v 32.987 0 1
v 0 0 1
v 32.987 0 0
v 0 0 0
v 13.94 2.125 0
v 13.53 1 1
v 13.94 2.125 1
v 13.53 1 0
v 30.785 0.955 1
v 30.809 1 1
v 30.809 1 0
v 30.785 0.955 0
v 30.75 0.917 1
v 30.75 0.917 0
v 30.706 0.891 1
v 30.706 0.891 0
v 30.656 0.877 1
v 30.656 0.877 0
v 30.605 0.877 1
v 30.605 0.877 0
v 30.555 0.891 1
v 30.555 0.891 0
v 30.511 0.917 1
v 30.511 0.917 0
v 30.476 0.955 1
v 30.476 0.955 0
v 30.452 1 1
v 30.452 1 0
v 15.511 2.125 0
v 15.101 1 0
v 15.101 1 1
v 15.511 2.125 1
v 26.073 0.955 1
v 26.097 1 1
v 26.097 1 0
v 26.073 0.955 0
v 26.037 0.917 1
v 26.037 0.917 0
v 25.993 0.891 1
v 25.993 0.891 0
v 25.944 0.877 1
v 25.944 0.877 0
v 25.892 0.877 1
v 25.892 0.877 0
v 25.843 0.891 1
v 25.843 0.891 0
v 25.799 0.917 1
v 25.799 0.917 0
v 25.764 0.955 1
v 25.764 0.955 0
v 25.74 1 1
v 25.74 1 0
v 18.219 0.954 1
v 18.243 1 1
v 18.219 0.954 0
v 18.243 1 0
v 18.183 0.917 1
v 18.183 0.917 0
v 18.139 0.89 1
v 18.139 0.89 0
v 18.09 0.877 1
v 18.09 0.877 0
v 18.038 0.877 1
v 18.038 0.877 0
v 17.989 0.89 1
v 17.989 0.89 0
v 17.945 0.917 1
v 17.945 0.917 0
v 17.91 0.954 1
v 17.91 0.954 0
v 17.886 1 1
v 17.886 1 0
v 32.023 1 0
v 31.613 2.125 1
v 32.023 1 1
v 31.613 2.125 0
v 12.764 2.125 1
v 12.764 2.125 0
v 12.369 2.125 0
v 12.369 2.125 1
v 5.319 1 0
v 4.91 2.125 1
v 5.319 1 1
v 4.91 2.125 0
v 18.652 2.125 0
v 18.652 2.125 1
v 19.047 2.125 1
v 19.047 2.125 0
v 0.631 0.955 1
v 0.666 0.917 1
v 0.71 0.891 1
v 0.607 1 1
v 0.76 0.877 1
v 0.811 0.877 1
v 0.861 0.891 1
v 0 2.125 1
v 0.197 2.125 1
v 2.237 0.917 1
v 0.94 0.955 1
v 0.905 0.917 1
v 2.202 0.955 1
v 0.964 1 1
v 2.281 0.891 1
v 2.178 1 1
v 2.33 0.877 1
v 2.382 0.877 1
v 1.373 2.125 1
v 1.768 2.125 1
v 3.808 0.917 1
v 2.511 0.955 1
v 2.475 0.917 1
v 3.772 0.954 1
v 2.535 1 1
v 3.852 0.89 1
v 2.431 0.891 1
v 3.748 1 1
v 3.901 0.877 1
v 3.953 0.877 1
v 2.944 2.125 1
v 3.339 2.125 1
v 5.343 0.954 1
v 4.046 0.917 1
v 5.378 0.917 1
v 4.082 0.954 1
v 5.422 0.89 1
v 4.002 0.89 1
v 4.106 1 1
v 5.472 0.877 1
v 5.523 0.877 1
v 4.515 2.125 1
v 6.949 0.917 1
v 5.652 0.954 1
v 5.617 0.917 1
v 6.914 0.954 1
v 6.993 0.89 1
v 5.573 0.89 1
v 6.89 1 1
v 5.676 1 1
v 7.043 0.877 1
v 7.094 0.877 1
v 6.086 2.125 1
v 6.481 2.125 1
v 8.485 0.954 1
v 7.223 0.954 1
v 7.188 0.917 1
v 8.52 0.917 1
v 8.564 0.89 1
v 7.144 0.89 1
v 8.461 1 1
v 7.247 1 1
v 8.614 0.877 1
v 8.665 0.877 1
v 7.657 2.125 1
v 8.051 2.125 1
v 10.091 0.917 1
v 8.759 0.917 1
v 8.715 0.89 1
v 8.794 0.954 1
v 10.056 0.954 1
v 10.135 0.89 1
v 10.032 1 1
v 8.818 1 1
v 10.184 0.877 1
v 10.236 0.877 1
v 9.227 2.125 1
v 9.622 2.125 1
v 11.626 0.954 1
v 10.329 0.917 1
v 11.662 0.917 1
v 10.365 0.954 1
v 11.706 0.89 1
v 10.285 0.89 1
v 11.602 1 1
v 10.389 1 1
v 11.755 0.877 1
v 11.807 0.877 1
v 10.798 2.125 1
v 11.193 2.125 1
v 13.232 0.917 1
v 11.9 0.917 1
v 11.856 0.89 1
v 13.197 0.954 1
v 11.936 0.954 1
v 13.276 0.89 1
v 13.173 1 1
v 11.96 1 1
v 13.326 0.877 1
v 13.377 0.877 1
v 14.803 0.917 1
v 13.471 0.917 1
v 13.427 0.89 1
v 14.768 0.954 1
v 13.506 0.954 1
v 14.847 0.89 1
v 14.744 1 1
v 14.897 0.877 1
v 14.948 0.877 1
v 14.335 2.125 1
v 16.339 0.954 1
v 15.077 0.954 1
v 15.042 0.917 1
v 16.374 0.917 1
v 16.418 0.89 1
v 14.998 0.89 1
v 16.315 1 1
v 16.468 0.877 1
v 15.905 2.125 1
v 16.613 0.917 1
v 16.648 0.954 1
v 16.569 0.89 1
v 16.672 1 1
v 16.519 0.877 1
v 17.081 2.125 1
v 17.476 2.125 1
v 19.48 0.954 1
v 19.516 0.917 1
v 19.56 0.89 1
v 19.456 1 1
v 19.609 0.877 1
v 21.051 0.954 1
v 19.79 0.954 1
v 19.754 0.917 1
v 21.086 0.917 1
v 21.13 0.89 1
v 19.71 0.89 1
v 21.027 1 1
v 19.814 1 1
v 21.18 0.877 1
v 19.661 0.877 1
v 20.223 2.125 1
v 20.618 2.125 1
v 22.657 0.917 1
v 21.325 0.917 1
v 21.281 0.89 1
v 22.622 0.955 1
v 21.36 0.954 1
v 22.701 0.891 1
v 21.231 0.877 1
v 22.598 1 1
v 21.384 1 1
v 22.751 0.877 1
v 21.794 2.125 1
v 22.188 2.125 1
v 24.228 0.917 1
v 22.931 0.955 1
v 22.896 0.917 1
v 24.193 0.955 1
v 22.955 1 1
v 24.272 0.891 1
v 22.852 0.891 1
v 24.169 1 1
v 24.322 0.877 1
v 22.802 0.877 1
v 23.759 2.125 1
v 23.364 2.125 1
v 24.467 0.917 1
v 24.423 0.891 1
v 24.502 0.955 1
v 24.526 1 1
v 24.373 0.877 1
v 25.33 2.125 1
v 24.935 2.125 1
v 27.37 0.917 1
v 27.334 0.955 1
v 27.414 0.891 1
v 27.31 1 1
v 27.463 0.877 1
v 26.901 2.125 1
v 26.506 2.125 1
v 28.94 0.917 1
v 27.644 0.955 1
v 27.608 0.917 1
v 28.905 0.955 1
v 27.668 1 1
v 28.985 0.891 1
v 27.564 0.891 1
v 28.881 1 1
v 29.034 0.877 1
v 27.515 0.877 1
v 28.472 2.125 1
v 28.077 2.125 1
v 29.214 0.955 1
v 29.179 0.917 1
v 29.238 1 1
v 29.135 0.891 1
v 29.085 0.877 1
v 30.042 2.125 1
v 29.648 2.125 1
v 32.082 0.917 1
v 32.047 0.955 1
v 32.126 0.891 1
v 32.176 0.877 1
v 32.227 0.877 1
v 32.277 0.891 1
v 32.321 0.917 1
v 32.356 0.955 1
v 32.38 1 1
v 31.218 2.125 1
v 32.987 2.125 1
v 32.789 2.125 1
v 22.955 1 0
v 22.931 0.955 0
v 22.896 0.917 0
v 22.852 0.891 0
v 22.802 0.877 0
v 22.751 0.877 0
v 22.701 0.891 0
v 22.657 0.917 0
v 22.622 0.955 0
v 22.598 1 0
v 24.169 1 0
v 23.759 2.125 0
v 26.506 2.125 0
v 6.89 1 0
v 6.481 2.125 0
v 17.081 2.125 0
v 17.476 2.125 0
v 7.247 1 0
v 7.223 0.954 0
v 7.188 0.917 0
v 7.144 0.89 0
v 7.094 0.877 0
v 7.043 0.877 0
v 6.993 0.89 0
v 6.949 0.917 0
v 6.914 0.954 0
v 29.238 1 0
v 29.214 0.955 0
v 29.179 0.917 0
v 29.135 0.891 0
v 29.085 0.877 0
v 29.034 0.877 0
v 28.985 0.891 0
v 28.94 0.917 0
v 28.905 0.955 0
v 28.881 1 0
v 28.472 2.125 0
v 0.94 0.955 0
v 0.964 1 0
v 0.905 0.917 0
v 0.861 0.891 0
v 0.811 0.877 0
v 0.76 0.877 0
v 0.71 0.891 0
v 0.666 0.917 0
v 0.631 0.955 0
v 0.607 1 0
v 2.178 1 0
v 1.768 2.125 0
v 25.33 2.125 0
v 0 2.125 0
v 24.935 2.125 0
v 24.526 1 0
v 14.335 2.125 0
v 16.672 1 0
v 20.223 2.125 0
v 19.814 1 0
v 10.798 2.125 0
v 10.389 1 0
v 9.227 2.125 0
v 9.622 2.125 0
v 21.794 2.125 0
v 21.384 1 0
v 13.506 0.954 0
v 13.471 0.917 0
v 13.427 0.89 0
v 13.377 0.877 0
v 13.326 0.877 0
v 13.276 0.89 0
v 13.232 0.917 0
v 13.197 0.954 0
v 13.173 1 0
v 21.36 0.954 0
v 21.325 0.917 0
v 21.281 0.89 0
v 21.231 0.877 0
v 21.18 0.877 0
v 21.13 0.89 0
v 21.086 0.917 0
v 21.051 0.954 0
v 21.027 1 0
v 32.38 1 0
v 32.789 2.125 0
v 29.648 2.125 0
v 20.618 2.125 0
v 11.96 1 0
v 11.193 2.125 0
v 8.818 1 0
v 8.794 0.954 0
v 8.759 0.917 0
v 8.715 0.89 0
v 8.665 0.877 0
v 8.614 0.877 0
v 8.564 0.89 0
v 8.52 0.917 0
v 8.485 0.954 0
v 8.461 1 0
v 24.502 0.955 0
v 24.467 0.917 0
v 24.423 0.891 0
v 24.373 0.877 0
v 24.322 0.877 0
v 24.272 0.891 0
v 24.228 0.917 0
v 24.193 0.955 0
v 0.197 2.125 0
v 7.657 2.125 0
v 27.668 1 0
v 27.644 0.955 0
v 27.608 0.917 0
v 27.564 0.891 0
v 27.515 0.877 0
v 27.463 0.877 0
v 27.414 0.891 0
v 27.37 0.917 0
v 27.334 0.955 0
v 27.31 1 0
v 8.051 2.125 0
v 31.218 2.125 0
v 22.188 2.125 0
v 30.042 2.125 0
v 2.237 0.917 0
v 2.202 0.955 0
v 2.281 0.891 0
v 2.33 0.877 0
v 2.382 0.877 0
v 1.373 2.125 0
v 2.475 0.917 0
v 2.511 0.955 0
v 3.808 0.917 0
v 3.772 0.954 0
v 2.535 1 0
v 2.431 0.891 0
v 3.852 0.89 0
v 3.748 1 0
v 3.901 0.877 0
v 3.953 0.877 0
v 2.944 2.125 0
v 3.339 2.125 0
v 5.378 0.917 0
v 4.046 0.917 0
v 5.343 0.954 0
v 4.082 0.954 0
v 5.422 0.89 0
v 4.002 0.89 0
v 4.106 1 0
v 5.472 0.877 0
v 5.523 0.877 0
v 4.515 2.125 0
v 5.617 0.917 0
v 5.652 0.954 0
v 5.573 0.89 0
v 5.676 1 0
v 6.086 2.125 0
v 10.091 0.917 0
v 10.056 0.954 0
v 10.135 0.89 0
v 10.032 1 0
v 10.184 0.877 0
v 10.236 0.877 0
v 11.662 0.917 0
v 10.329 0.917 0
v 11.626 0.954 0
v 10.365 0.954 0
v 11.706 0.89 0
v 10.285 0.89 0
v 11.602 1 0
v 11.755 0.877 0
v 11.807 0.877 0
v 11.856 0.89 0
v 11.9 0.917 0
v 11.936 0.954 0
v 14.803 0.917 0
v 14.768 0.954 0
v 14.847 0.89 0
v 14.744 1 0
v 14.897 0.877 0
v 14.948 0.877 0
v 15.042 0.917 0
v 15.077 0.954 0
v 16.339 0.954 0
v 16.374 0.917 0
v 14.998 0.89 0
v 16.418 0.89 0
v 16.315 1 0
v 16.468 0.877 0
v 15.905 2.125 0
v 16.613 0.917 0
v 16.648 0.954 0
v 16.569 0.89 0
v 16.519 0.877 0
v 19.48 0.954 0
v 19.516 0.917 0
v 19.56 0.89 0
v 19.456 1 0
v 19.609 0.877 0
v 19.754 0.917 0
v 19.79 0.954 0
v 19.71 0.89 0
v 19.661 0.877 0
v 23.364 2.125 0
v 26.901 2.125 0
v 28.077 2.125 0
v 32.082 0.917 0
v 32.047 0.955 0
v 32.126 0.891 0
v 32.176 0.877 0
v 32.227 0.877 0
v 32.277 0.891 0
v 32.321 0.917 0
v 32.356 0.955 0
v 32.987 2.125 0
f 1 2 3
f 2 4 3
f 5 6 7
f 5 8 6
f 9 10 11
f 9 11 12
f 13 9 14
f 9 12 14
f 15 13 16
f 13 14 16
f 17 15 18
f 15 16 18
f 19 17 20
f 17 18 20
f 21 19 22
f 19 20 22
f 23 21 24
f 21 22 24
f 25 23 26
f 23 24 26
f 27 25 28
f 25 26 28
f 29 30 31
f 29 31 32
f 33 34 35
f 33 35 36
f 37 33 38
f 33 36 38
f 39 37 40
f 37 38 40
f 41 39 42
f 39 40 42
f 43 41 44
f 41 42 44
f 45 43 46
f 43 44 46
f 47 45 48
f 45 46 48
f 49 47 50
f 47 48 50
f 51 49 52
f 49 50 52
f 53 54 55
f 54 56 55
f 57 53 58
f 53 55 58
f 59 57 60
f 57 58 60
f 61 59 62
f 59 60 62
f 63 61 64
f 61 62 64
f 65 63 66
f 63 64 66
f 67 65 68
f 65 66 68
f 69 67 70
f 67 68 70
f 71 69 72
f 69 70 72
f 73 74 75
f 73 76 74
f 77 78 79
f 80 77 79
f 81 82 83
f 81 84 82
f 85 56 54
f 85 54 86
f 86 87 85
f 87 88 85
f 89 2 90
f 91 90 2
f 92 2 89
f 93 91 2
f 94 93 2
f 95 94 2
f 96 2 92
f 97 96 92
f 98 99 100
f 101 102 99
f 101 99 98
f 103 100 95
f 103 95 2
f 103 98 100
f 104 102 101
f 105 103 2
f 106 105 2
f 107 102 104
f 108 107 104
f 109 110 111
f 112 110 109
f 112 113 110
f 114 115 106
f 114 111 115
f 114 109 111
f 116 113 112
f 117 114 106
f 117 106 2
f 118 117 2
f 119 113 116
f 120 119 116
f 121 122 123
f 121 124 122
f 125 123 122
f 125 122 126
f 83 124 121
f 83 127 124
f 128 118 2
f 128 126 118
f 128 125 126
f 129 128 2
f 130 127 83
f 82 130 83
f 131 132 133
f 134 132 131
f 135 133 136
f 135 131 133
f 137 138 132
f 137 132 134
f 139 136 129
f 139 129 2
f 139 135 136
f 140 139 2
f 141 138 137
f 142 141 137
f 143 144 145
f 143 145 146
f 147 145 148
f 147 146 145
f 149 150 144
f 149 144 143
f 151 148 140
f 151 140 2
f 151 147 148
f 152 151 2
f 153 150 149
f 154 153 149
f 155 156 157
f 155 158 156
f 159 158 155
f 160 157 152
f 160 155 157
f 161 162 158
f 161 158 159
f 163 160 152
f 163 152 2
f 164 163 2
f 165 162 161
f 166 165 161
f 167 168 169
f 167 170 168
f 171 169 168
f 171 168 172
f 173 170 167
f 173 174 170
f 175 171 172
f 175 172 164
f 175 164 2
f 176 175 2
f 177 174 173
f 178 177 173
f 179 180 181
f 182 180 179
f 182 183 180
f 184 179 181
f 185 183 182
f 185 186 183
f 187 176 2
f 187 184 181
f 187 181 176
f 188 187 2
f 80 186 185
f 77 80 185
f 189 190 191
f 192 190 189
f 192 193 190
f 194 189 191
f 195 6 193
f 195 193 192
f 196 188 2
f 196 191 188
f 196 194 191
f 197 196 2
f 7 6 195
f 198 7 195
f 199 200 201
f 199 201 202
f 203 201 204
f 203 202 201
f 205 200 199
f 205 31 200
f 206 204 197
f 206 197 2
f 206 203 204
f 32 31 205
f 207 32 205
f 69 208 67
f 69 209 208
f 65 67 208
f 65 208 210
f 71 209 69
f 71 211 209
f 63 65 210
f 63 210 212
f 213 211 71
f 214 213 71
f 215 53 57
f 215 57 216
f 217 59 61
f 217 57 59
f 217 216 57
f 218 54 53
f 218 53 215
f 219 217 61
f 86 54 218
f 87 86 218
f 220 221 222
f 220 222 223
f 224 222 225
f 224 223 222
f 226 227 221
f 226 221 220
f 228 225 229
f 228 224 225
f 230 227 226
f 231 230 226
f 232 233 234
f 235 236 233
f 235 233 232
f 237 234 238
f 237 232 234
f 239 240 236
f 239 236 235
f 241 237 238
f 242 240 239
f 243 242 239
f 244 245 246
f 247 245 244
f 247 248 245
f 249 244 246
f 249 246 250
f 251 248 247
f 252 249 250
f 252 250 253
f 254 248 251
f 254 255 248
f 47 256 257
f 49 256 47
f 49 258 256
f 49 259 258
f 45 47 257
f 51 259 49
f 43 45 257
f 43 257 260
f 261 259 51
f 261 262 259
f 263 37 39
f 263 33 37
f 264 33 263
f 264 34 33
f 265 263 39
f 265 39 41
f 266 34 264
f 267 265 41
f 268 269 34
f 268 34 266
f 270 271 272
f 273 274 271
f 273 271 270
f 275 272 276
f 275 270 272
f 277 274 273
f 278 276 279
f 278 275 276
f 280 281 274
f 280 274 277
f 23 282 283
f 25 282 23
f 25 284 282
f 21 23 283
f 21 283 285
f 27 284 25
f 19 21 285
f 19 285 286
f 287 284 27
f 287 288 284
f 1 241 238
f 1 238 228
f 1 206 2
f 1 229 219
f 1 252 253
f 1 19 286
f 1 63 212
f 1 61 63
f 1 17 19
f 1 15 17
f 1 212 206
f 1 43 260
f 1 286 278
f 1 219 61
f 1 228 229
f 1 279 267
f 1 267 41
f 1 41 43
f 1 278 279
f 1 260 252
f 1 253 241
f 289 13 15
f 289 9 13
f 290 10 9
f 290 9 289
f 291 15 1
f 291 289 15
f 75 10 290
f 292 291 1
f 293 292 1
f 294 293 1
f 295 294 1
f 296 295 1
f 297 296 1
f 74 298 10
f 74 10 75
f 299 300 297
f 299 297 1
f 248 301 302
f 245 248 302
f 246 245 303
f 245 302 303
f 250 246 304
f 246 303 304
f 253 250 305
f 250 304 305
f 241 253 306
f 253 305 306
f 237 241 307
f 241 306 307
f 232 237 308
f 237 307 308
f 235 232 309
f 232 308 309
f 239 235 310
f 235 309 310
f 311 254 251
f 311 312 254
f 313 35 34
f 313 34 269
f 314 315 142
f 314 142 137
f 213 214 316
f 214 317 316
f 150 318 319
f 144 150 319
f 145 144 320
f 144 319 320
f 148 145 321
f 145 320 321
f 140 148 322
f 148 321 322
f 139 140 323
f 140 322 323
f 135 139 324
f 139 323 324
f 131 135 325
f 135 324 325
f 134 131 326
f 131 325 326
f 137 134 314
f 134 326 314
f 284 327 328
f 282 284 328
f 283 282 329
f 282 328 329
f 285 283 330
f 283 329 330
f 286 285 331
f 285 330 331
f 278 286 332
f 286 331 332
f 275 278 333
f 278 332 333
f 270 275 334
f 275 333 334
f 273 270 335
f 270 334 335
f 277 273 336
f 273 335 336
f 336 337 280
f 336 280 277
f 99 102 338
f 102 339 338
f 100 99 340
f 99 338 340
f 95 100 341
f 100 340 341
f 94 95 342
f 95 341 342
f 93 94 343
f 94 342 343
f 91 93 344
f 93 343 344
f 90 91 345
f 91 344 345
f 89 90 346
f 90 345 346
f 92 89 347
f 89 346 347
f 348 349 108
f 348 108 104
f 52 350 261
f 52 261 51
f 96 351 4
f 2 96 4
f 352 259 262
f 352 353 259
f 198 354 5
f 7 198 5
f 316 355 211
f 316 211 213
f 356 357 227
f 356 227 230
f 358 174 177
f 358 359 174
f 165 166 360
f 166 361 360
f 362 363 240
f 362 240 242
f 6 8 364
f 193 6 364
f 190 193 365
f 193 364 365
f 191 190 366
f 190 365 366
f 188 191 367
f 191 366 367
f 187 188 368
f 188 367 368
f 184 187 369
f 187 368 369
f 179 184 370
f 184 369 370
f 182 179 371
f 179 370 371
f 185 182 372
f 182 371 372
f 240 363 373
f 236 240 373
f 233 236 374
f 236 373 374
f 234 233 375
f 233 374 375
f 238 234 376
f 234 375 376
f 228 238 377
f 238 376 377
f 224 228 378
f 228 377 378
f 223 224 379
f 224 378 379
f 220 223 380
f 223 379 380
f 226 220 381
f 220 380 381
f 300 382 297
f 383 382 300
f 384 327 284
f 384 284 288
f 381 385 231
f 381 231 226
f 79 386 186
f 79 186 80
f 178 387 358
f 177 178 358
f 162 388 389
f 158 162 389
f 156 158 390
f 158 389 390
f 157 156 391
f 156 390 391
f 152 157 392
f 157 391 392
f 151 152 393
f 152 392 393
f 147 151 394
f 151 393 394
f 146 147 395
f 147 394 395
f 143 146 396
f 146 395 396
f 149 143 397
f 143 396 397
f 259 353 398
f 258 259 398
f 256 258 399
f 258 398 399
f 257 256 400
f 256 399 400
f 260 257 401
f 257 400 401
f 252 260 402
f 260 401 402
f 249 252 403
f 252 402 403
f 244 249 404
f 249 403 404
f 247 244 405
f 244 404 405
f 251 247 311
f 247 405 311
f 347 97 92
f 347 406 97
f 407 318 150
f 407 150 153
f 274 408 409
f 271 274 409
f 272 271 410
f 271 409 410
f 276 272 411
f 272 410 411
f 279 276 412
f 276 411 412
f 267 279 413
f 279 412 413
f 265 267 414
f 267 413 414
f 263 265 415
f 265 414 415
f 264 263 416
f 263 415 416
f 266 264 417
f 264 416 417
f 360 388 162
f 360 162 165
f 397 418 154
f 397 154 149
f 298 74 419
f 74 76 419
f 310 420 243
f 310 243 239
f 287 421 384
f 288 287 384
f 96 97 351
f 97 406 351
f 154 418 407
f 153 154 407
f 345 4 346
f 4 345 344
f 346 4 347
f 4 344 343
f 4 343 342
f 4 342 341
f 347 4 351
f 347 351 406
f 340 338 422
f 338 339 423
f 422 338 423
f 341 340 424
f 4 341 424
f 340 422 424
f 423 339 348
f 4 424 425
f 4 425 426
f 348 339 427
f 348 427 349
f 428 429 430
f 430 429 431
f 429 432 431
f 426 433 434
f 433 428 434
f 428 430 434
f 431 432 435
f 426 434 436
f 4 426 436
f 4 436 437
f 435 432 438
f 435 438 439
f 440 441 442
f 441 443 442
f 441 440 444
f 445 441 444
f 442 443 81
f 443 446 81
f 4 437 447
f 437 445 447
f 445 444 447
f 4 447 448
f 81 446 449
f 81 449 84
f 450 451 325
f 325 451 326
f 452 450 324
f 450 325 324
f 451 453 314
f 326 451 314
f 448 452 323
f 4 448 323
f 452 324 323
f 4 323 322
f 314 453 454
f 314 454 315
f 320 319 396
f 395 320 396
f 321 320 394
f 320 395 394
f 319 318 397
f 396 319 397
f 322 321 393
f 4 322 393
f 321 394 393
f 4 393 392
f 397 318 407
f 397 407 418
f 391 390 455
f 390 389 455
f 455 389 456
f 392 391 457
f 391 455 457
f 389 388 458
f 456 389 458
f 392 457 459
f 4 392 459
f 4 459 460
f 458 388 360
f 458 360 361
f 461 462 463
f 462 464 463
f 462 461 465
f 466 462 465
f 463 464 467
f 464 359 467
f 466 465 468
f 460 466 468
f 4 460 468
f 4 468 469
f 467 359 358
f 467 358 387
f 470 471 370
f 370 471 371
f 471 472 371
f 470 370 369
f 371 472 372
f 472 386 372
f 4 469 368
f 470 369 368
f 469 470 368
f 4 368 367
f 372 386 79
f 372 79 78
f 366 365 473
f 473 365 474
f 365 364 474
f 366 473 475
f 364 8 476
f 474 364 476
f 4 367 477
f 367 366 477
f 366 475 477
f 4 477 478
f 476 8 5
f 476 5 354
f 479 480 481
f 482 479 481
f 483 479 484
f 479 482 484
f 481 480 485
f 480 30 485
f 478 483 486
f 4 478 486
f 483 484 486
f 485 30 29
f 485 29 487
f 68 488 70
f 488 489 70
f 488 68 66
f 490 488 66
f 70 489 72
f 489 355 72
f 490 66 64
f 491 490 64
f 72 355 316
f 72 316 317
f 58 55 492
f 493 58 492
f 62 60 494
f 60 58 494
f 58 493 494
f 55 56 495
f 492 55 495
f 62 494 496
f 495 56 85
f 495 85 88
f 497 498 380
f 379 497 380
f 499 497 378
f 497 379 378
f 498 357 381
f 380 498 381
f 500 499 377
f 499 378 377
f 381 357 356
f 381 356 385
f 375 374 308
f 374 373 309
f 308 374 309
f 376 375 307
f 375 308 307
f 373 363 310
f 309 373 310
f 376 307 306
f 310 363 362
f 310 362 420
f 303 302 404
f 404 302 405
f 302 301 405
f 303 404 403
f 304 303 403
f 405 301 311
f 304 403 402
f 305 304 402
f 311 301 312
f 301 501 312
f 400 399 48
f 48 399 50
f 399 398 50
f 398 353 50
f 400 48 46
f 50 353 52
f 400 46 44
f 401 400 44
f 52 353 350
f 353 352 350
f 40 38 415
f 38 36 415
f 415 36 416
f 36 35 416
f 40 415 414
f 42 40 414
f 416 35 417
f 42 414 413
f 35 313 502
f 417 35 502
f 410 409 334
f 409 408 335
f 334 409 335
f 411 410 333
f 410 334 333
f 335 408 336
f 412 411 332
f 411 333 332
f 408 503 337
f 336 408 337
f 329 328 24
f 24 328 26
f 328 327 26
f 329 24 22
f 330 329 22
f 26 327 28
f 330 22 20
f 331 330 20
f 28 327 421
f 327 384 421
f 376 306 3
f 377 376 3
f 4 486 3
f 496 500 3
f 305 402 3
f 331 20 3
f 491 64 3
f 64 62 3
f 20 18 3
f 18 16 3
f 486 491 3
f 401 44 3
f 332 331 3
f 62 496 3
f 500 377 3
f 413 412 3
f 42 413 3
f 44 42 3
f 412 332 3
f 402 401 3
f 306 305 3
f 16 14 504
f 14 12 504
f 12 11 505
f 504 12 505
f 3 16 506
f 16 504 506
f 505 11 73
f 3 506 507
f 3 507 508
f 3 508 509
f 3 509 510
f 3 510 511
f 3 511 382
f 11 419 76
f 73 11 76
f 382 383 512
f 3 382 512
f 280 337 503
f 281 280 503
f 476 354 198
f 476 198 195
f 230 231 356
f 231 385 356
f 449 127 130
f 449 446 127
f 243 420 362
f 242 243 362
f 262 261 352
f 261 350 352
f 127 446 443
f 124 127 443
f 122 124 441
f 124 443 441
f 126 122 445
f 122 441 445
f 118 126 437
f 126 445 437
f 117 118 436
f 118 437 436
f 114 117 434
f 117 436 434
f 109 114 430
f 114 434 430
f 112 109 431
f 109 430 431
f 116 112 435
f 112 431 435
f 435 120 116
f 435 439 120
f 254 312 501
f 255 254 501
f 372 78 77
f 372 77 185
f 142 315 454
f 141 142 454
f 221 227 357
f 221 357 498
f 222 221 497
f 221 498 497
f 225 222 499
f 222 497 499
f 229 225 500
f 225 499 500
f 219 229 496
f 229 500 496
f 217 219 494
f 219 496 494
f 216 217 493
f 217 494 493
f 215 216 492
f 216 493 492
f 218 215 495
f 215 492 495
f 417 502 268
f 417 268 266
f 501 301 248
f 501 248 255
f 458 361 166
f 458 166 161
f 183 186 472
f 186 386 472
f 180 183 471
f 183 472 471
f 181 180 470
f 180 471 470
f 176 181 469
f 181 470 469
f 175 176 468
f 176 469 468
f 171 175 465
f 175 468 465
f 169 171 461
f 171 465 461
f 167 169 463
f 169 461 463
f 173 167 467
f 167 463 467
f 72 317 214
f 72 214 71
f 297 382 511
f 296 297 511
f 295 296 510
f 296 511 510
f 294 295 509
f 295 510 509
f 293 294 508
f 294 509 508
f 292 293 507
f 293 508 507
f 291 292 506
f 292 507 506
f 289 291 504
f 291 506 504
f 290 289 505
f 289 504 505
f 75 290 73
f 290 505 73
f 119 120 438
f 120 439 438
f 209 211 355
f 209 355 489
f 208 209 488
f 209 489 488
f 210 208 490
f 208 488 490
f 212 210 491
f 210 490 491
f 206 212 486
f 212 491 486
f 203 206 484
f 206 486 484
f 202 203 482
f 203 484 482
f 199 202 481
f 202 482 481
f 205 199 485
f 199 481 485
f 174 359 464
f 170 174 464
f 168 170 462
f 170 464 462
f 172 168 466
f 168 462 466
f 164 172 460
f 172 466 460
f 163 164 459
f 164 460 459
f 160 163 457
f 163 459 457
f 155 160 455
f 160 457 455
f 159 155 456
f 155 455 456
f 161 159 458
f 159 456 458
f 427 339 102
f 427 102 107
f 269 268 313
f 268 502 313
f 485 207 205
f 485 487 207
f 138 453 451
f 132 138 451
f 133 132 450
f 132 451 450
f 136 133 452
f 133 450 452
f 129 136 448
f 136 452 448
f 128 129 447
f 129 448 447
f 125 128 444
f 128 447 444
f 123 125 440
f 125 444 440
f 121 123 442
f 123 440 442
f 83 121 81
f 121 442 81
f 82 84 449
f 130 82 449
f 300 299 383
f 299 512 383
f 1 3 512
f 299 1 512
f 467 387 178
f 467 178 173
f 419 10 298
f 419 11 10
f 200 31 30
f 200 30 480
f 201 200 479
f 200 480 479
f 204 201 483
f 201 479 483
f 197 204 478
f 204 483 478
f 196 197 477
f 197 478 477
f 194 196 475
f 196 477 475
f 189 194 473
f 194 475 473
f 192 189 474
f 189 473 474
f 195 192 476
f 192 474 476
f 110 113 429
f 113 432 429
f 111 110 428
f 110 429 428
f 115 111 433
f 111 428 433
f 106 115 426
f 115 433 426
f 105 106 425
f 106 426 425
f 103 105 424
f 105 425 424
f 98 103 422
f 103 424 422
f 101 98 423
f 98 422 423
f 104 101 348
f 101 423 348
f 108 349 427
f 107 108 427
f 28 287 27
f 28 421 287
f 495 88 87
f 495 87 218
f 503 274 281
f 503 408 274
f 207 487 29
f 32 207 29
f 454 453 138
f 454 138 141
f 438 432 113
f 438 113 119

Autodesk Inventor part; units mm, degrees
ref_plane "YZ Plane" through (0, 0, 0) normal (1, 0, 0) x (0, 1, 0)
ref_plane "XZ Plane" through (0, 0, 0) normal (0, 1, 0) x (-1, 0, 0)
ref_plane "XY Plane" through (0, 0, 0) normal (0, 0, 1) x (1, 0, 0)
sketch "草圖2" plane through (0, 0, 0) normal (0, 0, 1) x (1, 0, 0)
  line L0 (0, 0) -> (32.9867, 0)
  line L1 (32.9867, 0) -> (32.9867, 2.125)
  line L2 (32.9867, 2.125) -> (0, 2.125)
  line L3 (0, 2.125) -> (0, 0)
  line L4 (0, 1) -> (32.9867, 1) construction
  line L5 (0.1974, 2.125) -> (0.6069, 1)
  line L6 (0.9639, 1) -> (1.3734, 2.125)
  line L7 (0.7854, 2.125) -> (0.7854, 1) construction
  line L8 (0, 0.875) -> (32.9867, 0.875) construction
  arc A0 (0.6069, 1) -> (0.9639, 1) centre (0.7854, 1.065) ccw
  line L9 (0, 1.625) -> (32.9867, 1.625) construction
  line L10 (2.5347, 1) -> (2.9442, 2.125)
  arc A1 (2.1777, 1) -> (2.5347, 1) centre (2.3562, 1.065) ccw
  line L11 (1.7682, 2.125) -> (2.1777, 1)
  line L12 (4.1055, 1) -> (4.515, 2.125)
  arc A2 (3.7484, 1) -> (4.1055, 1) centre (3.927, 1.065) ccw
  line L13 (3.339, 2.125) -> (3.7484, 1)
  line L14 (5.6763, 1) -> (6.0858, 2.125)
  arc A3 (5.3192, 1) -> (5.6763, 1) centre (5.4978, 1.065) ccw
  line L15 (4.9098, 2.125) -> (5.3192, 1)
  line L16 (7.2471, 1) -> (7.6566, 2.125)
  arc A4 (6.89, 1) -> (7.2471, 1) centre (7.0686, 1.065) ccw
  line L17 (6.4806, 2.125) -> (6.89, 1)
  line L18 (8.8179, 1) -> (9.2274, 2.125)
  arc A5 (8.4608, 1) -> (8.8179, 1) centre (8.6394, 1.065) ccw
  line L19 (8.0514, 2.125) -> (8.4608, 1)
  line L20 (10.3887, 1) -> (10.7982, 2.125)
  arc A6 (10.0316, 1) -> (10.3887, 1) centre (10.2102, 1.065) ccw
  line L21 (9.6222, 2.125) -> (10.0316, 1)
  line L22 (11.9595, 1) -> (12.369, 2.125)
  arc A7 (11.6024, 1) -> (11.9595, 1) centre (11.781, 1.065) ccw
  line L23 (11.193, 2.125) -> (11.6024, 1)
  line L24 (13.5303, 1) -> (13.9398, 2.125)
  arc A8 (13.1732, 1) -> (13.5303, 1) centre (13.3518, 1.065) ccw
  line L25 (12.7638, 2.125) -> (13.1732, 1)
  line L26 (15.1011, 1) -> (15.5106, 2.125)
  arc A9 (14.744, 1) -> (15.1011, 1) centre (14.9226, 1.065) ccw
  line L27 (14.3346, 2.125) -> (14.744, 1)
  line L28 (16.6719, 1) -> (17.0814, 2.125)
  arc A10 (16.3148, 1) -> (16.6719, 1) centre (16.4934, 1.065) ccw
  line L29 (15.9054, 2.125) -> (16.3148, 1)
  line L30 (18.2427, 1) -> (18.6522, 2.125)
  arc A11 (17.8856, 1) -> (18.2427, 1) centre (18.0642, 1.065) ccw
  line L31 (17.4762, 2.125) -> (17.8856, 1)
  line L32 (19.8135, 1) -> (20.223, 2.125)
  arc A12 (19.4564, 1) -> (19.8135, 1) centre (19.635, 1.065) ccw
  line L33 (19.047, 2.125) -> (19.4564, 1)
  line L34 (21.3843, 1) -> (21.7938, 2.125)
  arc A13 (21.0272, 1) -> (21.3843, 1) centre (21.2058, 1.065) ccw
  line L35 (20.6177, 2.125) -> (21.0272, 1)
  line L36 (22.9551, 1) -> (23.3645, 2.125)
  arc A14 (22.598, 1) -> (22.9551, 1) centre (22.7765, 1.065) ccw
  line L37 (22.1885, 2.125) -> (22.598, 1)
  line L38 (24.5259, 1) -> (24.9353, 2.125)
  arc A15 (24.1688, 1) -> (24.5259, 1) centre (24.3473, 1.065) ccw
  line L39 (23.7593, 2.125) -> (24.1688, 1)
  line L40 (26.0967, 1) -> (26.5061, 2.125)
  arc A16 (25.7396, 1) -> (26.0967, 1) centre (25.9181, 1.065) ccw
  line L41 (25.3301, 2.125) -> (25.7396, 1)
  line L42 (27.6675, 1) -> (28.0769, 2.125)
  arc A17 (27.3104, 1) -> (27.6675, 1) centre (27.4889, 1.065) ccw
  line L43 (26.9009, 2.125) -> (27.3104, 1)
  line L44 (29.2383, 1) -> (29.6477, 2.125)
  arc A18 (28.8812, 1) -> (29.2383, 1) centre (29.0597, 1.065) ccw
  line L45 (28.4717, 2.125) -> (28.8812, 1)
  line L46 (30.8091, 1) -> (31.2185, 2.125)
  arc A19 (30.452, 1) -> (30.8091, 1) centre (30.6305, 1.065) ccw
  line L47 (30.0425, 2.125) -> (30.452, 1)
  line L48 (32.3799, 1) -> (32.7893, 2.125)
  arc A20 (32.0228, 1) -> (32.3799, 1) centre (32.2013, 1.065) ccw
  line L49 (31.6133, 2.125) -> (32.0228, 1)
  point P0 (0.7854, 0.5095)
  point P1 (0.7854, 0.875)
  point P2 (2.3562, 0.5095)
  point P3 (3.927, 0.5095)
  point P4 (5.4978, 0.5095)
  point P5 (7.0686, 0.5095)
  point P6 (8.6394, 0.5095)
  point P7 (10.2102, 0.5095)
  point P8 (11.781, 0.5095)
  point P9 (13.3518, 0.5095)
  point P10 (14.9226, 0.5095)
  point P11 (16.4934, 0.5095)
  point P12 (18.0642, 0.5095)
  point P13 (19.635, 0.5095)
  point P14 (21.2058, 0.5095)
  point P15 (22.7765, 0.5095)
  point P16 (24.3473, 0.5095)
  point P17 (25.9181, 0.5095)
  point P18 (27.4889, 0.5095)
  point P19 (29.0597, 0.5095)
  point P20 (30.6305, 0.5095)
  point P21 (32.2013, 0.5095)
  point P22 (32.7893, 2.125)
  point P23 (31.6133, 2.125)
  point P24 (31.2185, 2.125)
  point P25 (30.0425, 2.125)
  point P26 (29.6477, 2.125)
  point P27 (28.4717, 2.125)
  point P28 (28.0769, 2.125)
  point P29 (26.9009, 2.125)
  point P30 (26.5061, 2.125)
  point P31 (25.3301, 2.125)
  point P32 (24.9353, 2.125)
  point P33 (23.7593, 2.125)
  point P34 (23.3645, 2.125)
  point P35 (22.1885, 2.125)
  point P36 (21.7938, 2.125)
  point P37 (20.6177, 2.125)
  point P38 (20.223, 2.125)
  point P39 (19.047, 2.125)
  point P40 (18.6522, 2.125)
  point P41 (17.4762, 2.125)
  point P42 (17.0814, 2.125)
  point P43 (15.9054, 2.125)
  point P44 (15.5106, 2.125)
  point P45 (14.3346, 2.125)
  point P46 (13.9398, 2.125)
  point P47 (12.7638, 2.125)
  point P48 (12.369, 2.125)
  point P49 (11.193, 2.125)
  point P50 (10.7982, 2.125)
  point P51 (9.6222, 2.125)
  point P52 (9.2274, 2.125)
  point P53 (8.0514, 2.125)
  point P54 (7.6566, 2.125)
  point P55 (6.4806, 2.125)
  point P56 (6.0858, 2.125)
  point P57 (4.9098, 2.125)
  point P58 (4.515, 2.125)
  point P59 (3.339, 2.125)
  point P60 (2.9442, 2.125)
  point P61 (1.7682, 2.125)
  dimension "d17" = 32.9867
  dimension "d18" = 2.125
  dimension "d19" = 1.125
  dimension "d20" = 0.7854
  dimension "d23" = 20
  dimension "d24" = 20
  dimension "d25" = 0.125
  dimension "d26" = 0.19
  dimension "d37" = 0.5
  dimension "d40" = 1.5708
extrude "擠出3" add sketch "草圖2" along normal blind 1 contours L3 L2 L5 A0 L6 L11 A1 L10 L13 A2 L12 L15 A3 L14 L17 A4 L16 L19 A5 L18 L21 A6 L20 L23 A7 L22 L25 A8 L24 L27 A9 L26 L29 A10 L28 L31 A11 L30 L33 A12 L32 L35 A13 L34 L37 A14 L36 L39 A15 L38 L41 A16 L40 L43 A17 L42 L45 A18 L44 L47 A19 L46 L49 A20 L48 L1 L0
equation "\"d17\" = rack_length"
equation "\"d19\" = whole_depth"
equation "\"d20\" = tooth_thickness"
equation "\"d23\" = pressure_angle"
equation "\"d24\" = pressure_angle"
equation "\"d25\" = rack_dedendum"
equation "\"d26\" = fillet_radius"
equation "\"d37\" = addendum"
equation "\"d40\" = circular_pitch"
equation "\"whole_depth\" = 2.25 * module"
equation "\"tooth_thickness\" = 1.5708 * module"
equation "\"circular_pitch\" = 3.14159 * module"
equation "\"addendum\" = module"
equation "\"dedendum\" = 1.25 * module"
equation "\"addendum_diameter\" = pitch_diameter + 2 * addendum"
equation "\"dedendum_diameter\" = pitch_diameter - 2 * dedendum"
equation "\"pressure_angle\" = 20deg"
equation "\"fillet_radius\" = 0.38 * module"
equation "\"rack_dedendum\" = 0.25 * module"
equation "\"rack_length\" = 32.986723"
equation "\"pitch_diameter\" = 10"
properties part number "齒條"
